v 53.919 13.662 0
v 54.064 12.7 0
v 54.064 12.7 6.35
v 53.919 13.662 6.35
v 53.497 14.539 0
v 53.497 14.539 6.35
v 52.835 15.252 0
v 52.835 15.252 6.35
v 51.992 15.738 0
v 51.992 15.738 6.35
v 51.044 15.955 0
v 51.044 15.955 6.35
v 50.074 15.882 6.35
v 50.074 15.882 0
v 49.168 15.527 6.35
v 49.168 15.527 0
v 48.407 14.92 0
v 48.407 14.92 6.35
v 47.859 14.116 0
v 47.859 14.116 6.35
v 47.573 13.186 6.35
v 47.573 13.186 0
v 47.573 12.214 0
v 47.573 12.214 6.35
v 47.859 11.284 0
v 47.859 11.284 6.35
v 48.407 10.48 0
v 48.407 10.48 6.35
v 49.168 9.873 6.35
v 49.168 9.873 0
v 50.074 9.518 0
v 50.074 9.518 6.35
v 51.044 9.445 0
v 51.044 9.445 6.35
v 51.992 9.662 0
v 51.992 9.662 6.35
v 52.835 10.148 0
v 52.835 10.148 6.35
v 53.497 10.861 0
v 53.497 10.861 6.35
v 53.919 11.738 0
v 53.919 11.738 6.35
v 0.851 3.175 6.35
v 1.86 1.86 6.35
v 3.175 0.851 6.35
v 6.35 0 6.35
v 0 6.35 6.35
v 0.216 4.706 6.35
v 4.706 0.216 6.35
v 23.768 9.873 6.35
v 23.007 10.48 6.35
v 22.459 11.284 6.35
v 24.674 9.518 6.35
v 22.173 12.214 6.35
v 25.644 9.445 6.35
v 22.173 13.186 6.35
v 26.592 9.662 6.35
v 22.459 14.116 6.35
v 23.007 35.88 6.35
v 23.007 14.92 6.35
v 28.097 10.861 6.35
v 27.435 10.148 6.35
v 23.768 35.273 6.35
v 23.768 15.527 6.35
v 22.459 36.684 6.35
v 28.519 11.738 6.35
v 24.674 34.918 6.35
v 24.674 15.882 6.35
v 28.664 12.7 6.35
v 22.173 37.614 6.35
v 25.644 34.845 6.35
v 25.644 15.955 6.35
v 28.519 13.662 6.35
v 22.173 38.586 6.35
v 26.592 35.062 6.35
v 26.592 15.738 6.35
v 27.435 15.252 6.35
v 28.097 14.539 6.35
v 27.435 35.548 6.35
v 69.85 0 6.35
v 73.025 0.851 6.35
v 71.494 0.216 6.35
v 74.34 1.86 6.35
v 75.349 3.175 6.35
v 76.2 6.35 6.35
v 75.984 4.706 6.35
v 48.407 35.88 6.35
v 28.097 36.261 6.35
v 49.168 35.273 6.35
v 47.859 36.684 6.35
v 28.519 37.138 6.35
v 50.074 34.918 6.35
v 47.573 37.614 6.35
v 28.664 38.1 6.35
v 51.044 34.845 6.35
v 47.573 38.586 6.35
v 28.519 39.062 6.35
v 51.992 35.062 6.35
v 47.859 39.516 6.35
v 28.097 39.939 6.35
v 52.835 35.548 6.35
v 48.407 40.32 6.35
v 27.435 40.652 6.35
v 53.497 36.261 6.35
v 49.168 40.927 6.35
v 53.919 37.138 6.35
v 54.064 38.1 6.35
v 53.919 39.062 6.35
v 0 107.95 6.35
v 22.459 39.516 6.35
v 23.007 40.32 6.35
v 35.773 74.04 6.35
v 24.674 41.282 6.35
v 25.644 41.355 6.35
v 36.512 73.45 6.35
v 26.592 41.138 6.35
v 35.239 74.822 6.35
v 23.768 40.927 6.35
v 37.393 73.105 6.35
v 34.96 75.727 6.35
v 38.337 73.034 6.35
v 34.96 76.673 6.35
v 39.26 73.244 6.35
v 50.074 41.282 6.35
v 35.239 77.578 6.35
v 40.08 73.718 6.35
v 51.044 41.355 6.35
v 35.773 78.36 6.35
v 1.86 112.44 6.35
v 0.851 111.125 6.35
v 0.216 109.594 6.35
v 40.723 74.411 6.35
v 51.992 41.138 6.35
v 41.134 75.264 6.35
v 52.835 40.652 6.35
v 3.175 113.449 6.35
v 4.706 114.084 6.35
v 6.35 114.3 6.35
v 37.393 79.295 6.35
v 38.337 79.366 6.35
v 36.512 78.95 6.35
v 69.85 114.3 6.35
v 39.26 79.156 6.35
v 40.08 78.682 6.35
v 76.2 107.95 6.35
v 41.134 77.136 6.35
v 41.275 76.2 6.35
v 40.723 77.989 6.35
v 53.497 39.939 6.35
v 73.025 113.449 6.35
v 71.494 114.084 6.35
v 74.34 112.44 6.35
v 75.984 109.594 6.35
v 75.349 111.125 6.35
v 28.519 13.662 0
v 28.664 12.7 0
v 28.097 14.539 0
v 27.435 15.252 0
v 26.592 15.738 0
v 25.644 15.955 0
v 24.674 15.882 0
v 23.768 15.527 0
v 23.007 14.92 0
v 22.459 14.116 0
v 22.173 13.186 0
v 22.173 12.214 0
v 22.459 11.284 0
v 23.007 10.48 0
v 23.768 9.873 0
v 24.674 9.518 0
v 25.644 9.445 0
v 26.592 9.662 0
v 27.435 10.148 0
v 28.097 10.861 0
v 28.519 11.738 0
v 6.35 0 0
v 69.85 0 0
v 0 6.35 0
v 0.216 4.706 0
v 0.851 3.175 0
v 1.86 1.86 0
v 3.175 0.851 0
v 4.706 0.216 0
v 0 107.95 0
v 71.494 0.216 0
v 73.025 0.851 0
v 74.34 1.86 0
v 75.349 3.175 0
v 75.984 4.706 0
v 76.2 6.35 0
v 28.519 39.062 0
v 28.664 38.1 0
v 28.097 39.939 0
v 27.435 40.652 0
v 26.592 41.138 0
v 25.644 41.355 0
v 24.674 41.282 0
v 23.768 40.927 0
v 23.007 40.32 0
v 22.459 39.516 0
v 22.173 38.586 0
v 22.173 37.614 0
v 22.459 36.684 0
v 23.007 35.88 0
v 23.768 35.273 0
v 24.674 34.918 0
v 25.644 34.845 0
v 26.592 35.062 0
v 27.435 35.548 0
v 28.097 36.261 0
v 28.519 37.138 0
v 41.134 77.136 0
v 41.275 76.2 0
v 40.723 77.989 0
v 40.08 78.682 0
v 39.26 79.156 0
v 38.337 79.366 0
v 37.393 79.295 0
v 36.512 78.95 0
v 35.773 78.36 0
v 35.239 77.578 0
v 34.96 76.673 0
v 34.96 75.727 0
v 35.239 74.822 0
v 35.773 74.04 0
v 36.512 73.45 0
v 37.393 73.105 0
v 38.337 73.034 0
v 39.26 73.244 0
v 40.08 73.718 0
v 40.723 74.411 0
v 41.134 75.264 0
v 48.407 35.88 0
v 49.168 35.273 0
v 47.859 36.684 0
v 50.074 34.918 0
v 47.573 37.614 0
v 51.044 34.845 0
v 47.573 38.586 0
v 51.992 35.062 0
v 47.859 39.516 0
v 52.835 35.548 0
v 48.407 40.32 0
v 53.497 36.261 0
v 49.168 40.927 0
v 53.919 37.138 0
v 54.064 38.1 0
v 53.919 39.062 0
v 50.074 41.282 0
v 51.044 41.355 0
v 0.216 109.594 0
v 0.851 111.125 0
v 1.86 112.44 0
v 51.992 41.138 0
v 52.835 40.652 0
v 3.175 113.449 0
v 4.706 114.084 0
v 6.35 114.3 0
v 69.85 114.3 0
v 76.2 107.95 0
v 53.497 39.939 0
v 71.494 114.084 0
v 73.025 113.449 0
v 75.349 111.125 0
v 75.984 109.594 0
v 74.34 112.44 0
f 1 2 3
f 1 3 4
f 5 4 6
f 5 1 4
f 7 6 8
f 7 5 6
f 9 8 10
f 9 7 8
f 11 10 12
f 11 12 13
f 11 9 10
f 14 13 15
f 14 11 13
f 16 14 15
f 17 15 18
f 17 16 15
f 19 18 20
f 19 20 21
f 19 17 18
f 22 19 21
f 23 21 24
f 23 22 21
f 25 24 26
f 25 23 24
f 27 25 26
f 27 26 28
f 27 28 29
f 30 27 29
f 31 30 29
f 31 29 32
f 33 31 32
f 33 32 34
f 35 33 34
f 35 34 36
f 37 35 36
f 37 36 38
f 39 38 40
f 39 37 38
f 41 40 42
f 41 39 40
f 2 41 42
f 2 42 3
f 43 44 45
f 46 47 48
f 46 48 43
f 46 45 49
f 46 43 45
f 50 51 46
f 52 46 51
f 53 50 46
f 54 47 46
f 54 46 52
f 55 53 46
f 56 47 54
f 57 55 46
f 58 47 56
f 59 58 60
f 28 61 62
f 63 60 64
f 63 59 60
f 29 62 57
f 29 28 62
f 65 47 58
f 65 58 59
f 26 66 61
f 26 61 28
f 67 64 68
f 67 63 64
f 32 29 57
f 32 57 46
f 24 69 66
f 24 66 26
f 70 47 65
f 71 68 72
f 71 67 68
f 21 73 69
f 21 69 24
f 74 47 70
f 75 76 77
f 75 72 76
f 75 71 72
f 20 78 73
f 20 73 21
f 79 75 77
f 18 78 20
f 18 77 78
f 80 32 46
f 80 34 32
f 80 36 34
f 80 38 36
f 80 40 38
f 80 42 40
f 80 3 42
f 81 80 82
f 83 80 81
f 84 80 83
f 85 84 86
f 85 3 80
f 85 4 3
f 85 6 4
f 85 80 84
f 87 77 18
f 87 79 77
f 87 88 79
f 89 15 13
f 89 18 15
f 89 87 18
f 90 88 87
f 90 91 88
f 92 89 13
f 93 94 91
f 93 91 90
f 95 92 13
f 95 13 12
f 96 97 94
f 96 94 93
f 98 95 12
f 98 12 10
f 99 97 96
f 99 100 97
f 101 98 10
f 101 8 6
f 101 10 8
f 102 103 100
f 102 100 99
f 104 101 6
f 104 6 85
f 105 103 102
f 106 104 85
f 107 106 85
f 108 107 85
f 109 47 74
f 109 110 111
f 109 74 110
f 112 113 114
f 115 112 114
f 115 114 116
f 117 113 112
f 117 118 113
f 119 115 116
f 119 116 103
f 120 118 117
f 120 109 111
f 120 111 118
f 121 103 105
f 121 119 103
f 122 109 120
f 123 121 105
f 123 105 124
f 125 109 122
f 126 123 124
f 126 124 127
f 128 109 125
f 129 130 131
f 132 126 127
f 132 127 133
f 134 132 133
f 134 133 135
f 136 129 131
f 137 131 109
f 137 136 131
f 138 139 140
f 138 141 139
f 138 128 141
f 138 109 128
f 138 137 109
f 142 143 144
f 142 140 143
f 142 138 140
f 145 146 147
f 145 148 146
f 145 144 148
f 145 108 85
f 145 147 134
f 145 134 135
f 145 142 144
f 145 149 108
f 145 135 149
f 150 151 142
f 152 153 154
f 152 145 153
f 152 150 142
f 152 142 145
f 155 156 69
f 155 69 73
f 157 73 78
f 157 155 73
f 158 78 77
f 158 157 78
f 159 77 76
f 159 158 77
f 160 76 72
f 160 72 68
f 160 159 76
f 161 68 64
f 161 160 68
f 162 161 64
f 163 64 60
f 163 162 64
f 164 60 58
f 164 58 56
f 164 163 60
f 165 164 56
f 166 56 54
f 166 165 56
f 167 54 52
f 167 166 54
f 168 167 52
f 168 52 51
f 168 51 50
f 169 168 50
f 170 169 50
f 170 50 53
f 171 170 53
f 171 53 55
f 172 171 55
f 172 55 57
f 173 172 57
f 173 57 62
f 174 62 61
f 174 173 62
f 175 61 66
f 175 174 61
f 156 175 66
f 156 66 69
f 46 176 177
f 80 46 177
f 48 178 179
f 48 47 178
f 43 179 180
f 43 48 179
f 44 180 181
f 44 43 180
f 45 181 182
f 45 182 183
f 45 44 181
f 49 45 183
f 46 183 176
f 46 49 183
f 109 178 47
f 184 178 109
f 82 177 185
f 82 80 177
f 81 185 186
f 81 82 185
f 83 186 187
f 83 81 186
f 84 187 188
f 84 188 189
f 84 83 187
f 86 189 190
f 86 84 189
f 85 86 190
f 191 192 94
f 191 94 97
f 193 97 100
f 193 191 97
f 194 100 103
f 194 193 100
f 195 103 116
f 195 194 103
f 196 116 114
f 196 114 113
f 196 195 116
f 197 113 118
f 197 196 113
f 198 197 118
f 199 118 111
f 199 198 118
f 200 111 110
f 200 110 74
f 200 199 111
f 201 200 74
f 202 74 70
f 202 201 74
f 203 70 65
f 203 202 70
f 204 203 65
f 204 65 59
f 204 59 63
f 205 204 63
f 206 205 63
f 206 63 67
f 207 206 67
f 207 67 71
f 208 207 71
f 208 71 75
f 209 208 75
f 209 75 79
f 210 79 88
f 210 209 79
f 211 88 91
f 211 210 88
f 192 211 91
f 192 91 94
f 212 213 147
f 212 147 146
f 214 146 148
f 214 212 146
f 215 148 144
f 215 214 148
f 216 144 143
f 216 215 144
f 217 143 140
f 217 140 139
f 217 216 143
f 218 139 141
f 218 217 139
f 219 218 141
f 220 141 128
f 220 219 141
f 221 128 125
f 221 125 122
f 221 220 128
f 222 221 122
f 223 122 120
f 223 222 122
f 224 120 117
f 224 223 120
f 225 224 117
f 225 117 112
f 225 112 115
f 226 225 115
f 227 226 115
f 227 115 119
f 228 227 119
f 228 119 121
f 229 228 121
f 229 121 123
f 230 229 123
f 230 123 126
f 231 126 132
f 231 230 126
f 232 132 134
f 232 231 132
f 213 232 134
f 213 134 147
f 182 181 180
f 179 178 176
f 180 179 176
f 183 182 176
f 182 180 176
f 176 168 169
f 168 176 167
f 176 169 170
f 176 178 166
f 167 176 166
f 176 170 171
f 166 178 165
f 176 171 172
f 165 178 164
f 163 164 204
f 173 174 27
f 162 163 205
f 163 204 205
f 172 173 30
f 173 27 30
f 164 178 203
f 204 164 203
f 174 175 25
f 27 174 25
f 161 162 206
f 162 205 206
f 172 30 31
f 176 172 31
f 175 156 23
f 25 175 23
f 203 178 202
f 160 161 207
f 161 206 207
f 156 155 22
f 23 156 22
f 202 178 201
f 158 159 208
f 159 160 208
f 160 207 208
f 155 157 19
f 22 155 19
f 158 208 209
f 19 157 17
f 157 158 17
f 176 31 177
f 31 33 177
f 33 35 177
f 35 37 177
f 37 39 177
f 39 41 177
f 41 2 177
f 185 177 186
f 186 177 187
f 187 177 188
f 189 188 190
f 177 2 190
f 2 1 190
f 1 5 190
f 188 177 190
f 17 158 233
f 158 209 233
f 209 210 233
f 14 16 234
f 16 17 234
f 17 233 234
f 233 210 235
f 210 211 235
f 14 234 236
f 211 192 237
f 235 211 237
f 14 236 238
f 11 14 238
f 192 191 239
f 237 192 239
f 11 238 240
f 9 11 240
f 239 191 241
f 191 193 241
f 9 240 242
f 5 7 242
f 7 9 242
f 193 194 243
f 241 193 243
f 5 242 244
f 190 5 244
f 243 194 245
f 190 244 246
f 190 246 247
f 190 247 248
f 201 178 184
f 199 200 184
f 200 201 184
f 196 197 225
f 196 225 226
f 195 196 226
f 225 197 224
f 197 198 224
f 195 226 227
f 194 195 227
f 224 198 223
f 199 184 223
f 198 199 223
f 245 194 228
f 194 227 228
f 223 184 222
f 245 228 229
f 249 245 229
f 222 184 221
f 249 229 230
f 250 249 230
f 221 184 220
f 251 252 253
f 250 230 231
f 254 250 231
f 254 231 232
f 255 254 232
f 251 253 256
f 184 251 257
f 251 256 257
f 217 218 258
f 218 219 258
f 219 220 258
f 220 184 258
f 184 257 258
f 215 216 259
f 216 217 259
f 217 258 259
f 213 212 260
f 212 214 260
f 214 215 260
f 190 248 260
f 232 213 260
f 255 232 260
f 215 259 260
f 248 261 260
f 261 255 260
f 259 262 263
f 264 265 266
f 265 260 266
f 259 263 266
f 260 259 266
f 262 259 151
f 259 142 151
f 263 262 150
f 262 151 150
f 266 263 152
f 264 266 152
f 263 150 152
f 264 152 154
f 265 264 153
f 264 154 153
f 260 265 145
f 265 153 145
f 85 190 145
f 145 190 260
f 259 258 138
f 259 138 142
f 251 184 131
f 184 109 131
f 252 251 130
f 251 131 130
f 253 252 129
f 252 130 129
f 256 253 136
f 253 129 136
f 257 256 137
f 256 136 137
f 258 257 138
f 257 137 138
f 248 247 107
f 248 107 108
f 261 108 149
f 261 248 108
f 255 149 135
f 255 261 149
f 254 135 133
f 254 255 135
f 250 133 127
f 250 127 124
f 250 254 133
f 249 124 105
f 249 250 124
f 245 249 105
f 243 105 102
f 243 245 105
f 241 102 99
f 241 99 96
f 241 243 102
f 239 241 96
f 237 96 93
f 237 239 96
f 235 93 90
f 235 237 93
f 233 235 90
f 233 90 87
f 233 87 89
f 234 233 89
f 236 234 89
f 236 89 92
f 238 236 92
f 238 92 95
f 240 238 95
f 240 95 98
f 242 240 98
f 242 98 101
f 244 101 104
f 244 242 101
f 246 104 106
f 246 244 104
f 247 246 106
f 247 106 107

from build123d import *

# Parameters (mm, degrees)
SKETCH1_W      = 76.2
SKETCH1_H      = 114.3
SKETCH1_R      = 3.2639
SKETCH1_R_2    = 3.175
EXTRUDE1_DEPTH = 6.35
FILLET1_R      = 6.35


with BuildPart() as part:
    # Sketch1 → Extrude1 (new body)
    with BuildSketch(Plane.XY):
        with Locations((38.1, 57.15)):
            Rectangle(SKETCH1_W, SKETCH1_H)
        with Locations((25.4, 12.7)):
            Circle(SKETCH1_R, mode=Mode.SUBTRACT)
        with Locations((50.8, 12.7)):
            Circle(SKETCH1_R, mode=Mode.SUBTRACT)
        with Locations((25.4, 38.1)):
            Circle(SKETCH1_R, mode=Mode.SUBTRACT)
        with Locations((50.8, 38.1)):
            Circle(SKETCH1_R, mode=Mode.SUBTRACT)
        with Locations((38.1, 76.2)):
            Circle(SKETCH1_R_2, mode=Mode.SUBTRACT)
    extrude(amount=EXTRUDE1_DEPTH)

    # Fillet1
    fillet1_edges = [part.edges().sort_by_distance(p)[0] for p in [
        (0, 114.3, 3.175),
        (76.2, 114.3, 3.175),
        (76.2, 0, 3.175),
        (0, 0, 3.175),
    ]]
    fillet(fillet1_edges, radius=FILLET1_R)


solid = part.part
